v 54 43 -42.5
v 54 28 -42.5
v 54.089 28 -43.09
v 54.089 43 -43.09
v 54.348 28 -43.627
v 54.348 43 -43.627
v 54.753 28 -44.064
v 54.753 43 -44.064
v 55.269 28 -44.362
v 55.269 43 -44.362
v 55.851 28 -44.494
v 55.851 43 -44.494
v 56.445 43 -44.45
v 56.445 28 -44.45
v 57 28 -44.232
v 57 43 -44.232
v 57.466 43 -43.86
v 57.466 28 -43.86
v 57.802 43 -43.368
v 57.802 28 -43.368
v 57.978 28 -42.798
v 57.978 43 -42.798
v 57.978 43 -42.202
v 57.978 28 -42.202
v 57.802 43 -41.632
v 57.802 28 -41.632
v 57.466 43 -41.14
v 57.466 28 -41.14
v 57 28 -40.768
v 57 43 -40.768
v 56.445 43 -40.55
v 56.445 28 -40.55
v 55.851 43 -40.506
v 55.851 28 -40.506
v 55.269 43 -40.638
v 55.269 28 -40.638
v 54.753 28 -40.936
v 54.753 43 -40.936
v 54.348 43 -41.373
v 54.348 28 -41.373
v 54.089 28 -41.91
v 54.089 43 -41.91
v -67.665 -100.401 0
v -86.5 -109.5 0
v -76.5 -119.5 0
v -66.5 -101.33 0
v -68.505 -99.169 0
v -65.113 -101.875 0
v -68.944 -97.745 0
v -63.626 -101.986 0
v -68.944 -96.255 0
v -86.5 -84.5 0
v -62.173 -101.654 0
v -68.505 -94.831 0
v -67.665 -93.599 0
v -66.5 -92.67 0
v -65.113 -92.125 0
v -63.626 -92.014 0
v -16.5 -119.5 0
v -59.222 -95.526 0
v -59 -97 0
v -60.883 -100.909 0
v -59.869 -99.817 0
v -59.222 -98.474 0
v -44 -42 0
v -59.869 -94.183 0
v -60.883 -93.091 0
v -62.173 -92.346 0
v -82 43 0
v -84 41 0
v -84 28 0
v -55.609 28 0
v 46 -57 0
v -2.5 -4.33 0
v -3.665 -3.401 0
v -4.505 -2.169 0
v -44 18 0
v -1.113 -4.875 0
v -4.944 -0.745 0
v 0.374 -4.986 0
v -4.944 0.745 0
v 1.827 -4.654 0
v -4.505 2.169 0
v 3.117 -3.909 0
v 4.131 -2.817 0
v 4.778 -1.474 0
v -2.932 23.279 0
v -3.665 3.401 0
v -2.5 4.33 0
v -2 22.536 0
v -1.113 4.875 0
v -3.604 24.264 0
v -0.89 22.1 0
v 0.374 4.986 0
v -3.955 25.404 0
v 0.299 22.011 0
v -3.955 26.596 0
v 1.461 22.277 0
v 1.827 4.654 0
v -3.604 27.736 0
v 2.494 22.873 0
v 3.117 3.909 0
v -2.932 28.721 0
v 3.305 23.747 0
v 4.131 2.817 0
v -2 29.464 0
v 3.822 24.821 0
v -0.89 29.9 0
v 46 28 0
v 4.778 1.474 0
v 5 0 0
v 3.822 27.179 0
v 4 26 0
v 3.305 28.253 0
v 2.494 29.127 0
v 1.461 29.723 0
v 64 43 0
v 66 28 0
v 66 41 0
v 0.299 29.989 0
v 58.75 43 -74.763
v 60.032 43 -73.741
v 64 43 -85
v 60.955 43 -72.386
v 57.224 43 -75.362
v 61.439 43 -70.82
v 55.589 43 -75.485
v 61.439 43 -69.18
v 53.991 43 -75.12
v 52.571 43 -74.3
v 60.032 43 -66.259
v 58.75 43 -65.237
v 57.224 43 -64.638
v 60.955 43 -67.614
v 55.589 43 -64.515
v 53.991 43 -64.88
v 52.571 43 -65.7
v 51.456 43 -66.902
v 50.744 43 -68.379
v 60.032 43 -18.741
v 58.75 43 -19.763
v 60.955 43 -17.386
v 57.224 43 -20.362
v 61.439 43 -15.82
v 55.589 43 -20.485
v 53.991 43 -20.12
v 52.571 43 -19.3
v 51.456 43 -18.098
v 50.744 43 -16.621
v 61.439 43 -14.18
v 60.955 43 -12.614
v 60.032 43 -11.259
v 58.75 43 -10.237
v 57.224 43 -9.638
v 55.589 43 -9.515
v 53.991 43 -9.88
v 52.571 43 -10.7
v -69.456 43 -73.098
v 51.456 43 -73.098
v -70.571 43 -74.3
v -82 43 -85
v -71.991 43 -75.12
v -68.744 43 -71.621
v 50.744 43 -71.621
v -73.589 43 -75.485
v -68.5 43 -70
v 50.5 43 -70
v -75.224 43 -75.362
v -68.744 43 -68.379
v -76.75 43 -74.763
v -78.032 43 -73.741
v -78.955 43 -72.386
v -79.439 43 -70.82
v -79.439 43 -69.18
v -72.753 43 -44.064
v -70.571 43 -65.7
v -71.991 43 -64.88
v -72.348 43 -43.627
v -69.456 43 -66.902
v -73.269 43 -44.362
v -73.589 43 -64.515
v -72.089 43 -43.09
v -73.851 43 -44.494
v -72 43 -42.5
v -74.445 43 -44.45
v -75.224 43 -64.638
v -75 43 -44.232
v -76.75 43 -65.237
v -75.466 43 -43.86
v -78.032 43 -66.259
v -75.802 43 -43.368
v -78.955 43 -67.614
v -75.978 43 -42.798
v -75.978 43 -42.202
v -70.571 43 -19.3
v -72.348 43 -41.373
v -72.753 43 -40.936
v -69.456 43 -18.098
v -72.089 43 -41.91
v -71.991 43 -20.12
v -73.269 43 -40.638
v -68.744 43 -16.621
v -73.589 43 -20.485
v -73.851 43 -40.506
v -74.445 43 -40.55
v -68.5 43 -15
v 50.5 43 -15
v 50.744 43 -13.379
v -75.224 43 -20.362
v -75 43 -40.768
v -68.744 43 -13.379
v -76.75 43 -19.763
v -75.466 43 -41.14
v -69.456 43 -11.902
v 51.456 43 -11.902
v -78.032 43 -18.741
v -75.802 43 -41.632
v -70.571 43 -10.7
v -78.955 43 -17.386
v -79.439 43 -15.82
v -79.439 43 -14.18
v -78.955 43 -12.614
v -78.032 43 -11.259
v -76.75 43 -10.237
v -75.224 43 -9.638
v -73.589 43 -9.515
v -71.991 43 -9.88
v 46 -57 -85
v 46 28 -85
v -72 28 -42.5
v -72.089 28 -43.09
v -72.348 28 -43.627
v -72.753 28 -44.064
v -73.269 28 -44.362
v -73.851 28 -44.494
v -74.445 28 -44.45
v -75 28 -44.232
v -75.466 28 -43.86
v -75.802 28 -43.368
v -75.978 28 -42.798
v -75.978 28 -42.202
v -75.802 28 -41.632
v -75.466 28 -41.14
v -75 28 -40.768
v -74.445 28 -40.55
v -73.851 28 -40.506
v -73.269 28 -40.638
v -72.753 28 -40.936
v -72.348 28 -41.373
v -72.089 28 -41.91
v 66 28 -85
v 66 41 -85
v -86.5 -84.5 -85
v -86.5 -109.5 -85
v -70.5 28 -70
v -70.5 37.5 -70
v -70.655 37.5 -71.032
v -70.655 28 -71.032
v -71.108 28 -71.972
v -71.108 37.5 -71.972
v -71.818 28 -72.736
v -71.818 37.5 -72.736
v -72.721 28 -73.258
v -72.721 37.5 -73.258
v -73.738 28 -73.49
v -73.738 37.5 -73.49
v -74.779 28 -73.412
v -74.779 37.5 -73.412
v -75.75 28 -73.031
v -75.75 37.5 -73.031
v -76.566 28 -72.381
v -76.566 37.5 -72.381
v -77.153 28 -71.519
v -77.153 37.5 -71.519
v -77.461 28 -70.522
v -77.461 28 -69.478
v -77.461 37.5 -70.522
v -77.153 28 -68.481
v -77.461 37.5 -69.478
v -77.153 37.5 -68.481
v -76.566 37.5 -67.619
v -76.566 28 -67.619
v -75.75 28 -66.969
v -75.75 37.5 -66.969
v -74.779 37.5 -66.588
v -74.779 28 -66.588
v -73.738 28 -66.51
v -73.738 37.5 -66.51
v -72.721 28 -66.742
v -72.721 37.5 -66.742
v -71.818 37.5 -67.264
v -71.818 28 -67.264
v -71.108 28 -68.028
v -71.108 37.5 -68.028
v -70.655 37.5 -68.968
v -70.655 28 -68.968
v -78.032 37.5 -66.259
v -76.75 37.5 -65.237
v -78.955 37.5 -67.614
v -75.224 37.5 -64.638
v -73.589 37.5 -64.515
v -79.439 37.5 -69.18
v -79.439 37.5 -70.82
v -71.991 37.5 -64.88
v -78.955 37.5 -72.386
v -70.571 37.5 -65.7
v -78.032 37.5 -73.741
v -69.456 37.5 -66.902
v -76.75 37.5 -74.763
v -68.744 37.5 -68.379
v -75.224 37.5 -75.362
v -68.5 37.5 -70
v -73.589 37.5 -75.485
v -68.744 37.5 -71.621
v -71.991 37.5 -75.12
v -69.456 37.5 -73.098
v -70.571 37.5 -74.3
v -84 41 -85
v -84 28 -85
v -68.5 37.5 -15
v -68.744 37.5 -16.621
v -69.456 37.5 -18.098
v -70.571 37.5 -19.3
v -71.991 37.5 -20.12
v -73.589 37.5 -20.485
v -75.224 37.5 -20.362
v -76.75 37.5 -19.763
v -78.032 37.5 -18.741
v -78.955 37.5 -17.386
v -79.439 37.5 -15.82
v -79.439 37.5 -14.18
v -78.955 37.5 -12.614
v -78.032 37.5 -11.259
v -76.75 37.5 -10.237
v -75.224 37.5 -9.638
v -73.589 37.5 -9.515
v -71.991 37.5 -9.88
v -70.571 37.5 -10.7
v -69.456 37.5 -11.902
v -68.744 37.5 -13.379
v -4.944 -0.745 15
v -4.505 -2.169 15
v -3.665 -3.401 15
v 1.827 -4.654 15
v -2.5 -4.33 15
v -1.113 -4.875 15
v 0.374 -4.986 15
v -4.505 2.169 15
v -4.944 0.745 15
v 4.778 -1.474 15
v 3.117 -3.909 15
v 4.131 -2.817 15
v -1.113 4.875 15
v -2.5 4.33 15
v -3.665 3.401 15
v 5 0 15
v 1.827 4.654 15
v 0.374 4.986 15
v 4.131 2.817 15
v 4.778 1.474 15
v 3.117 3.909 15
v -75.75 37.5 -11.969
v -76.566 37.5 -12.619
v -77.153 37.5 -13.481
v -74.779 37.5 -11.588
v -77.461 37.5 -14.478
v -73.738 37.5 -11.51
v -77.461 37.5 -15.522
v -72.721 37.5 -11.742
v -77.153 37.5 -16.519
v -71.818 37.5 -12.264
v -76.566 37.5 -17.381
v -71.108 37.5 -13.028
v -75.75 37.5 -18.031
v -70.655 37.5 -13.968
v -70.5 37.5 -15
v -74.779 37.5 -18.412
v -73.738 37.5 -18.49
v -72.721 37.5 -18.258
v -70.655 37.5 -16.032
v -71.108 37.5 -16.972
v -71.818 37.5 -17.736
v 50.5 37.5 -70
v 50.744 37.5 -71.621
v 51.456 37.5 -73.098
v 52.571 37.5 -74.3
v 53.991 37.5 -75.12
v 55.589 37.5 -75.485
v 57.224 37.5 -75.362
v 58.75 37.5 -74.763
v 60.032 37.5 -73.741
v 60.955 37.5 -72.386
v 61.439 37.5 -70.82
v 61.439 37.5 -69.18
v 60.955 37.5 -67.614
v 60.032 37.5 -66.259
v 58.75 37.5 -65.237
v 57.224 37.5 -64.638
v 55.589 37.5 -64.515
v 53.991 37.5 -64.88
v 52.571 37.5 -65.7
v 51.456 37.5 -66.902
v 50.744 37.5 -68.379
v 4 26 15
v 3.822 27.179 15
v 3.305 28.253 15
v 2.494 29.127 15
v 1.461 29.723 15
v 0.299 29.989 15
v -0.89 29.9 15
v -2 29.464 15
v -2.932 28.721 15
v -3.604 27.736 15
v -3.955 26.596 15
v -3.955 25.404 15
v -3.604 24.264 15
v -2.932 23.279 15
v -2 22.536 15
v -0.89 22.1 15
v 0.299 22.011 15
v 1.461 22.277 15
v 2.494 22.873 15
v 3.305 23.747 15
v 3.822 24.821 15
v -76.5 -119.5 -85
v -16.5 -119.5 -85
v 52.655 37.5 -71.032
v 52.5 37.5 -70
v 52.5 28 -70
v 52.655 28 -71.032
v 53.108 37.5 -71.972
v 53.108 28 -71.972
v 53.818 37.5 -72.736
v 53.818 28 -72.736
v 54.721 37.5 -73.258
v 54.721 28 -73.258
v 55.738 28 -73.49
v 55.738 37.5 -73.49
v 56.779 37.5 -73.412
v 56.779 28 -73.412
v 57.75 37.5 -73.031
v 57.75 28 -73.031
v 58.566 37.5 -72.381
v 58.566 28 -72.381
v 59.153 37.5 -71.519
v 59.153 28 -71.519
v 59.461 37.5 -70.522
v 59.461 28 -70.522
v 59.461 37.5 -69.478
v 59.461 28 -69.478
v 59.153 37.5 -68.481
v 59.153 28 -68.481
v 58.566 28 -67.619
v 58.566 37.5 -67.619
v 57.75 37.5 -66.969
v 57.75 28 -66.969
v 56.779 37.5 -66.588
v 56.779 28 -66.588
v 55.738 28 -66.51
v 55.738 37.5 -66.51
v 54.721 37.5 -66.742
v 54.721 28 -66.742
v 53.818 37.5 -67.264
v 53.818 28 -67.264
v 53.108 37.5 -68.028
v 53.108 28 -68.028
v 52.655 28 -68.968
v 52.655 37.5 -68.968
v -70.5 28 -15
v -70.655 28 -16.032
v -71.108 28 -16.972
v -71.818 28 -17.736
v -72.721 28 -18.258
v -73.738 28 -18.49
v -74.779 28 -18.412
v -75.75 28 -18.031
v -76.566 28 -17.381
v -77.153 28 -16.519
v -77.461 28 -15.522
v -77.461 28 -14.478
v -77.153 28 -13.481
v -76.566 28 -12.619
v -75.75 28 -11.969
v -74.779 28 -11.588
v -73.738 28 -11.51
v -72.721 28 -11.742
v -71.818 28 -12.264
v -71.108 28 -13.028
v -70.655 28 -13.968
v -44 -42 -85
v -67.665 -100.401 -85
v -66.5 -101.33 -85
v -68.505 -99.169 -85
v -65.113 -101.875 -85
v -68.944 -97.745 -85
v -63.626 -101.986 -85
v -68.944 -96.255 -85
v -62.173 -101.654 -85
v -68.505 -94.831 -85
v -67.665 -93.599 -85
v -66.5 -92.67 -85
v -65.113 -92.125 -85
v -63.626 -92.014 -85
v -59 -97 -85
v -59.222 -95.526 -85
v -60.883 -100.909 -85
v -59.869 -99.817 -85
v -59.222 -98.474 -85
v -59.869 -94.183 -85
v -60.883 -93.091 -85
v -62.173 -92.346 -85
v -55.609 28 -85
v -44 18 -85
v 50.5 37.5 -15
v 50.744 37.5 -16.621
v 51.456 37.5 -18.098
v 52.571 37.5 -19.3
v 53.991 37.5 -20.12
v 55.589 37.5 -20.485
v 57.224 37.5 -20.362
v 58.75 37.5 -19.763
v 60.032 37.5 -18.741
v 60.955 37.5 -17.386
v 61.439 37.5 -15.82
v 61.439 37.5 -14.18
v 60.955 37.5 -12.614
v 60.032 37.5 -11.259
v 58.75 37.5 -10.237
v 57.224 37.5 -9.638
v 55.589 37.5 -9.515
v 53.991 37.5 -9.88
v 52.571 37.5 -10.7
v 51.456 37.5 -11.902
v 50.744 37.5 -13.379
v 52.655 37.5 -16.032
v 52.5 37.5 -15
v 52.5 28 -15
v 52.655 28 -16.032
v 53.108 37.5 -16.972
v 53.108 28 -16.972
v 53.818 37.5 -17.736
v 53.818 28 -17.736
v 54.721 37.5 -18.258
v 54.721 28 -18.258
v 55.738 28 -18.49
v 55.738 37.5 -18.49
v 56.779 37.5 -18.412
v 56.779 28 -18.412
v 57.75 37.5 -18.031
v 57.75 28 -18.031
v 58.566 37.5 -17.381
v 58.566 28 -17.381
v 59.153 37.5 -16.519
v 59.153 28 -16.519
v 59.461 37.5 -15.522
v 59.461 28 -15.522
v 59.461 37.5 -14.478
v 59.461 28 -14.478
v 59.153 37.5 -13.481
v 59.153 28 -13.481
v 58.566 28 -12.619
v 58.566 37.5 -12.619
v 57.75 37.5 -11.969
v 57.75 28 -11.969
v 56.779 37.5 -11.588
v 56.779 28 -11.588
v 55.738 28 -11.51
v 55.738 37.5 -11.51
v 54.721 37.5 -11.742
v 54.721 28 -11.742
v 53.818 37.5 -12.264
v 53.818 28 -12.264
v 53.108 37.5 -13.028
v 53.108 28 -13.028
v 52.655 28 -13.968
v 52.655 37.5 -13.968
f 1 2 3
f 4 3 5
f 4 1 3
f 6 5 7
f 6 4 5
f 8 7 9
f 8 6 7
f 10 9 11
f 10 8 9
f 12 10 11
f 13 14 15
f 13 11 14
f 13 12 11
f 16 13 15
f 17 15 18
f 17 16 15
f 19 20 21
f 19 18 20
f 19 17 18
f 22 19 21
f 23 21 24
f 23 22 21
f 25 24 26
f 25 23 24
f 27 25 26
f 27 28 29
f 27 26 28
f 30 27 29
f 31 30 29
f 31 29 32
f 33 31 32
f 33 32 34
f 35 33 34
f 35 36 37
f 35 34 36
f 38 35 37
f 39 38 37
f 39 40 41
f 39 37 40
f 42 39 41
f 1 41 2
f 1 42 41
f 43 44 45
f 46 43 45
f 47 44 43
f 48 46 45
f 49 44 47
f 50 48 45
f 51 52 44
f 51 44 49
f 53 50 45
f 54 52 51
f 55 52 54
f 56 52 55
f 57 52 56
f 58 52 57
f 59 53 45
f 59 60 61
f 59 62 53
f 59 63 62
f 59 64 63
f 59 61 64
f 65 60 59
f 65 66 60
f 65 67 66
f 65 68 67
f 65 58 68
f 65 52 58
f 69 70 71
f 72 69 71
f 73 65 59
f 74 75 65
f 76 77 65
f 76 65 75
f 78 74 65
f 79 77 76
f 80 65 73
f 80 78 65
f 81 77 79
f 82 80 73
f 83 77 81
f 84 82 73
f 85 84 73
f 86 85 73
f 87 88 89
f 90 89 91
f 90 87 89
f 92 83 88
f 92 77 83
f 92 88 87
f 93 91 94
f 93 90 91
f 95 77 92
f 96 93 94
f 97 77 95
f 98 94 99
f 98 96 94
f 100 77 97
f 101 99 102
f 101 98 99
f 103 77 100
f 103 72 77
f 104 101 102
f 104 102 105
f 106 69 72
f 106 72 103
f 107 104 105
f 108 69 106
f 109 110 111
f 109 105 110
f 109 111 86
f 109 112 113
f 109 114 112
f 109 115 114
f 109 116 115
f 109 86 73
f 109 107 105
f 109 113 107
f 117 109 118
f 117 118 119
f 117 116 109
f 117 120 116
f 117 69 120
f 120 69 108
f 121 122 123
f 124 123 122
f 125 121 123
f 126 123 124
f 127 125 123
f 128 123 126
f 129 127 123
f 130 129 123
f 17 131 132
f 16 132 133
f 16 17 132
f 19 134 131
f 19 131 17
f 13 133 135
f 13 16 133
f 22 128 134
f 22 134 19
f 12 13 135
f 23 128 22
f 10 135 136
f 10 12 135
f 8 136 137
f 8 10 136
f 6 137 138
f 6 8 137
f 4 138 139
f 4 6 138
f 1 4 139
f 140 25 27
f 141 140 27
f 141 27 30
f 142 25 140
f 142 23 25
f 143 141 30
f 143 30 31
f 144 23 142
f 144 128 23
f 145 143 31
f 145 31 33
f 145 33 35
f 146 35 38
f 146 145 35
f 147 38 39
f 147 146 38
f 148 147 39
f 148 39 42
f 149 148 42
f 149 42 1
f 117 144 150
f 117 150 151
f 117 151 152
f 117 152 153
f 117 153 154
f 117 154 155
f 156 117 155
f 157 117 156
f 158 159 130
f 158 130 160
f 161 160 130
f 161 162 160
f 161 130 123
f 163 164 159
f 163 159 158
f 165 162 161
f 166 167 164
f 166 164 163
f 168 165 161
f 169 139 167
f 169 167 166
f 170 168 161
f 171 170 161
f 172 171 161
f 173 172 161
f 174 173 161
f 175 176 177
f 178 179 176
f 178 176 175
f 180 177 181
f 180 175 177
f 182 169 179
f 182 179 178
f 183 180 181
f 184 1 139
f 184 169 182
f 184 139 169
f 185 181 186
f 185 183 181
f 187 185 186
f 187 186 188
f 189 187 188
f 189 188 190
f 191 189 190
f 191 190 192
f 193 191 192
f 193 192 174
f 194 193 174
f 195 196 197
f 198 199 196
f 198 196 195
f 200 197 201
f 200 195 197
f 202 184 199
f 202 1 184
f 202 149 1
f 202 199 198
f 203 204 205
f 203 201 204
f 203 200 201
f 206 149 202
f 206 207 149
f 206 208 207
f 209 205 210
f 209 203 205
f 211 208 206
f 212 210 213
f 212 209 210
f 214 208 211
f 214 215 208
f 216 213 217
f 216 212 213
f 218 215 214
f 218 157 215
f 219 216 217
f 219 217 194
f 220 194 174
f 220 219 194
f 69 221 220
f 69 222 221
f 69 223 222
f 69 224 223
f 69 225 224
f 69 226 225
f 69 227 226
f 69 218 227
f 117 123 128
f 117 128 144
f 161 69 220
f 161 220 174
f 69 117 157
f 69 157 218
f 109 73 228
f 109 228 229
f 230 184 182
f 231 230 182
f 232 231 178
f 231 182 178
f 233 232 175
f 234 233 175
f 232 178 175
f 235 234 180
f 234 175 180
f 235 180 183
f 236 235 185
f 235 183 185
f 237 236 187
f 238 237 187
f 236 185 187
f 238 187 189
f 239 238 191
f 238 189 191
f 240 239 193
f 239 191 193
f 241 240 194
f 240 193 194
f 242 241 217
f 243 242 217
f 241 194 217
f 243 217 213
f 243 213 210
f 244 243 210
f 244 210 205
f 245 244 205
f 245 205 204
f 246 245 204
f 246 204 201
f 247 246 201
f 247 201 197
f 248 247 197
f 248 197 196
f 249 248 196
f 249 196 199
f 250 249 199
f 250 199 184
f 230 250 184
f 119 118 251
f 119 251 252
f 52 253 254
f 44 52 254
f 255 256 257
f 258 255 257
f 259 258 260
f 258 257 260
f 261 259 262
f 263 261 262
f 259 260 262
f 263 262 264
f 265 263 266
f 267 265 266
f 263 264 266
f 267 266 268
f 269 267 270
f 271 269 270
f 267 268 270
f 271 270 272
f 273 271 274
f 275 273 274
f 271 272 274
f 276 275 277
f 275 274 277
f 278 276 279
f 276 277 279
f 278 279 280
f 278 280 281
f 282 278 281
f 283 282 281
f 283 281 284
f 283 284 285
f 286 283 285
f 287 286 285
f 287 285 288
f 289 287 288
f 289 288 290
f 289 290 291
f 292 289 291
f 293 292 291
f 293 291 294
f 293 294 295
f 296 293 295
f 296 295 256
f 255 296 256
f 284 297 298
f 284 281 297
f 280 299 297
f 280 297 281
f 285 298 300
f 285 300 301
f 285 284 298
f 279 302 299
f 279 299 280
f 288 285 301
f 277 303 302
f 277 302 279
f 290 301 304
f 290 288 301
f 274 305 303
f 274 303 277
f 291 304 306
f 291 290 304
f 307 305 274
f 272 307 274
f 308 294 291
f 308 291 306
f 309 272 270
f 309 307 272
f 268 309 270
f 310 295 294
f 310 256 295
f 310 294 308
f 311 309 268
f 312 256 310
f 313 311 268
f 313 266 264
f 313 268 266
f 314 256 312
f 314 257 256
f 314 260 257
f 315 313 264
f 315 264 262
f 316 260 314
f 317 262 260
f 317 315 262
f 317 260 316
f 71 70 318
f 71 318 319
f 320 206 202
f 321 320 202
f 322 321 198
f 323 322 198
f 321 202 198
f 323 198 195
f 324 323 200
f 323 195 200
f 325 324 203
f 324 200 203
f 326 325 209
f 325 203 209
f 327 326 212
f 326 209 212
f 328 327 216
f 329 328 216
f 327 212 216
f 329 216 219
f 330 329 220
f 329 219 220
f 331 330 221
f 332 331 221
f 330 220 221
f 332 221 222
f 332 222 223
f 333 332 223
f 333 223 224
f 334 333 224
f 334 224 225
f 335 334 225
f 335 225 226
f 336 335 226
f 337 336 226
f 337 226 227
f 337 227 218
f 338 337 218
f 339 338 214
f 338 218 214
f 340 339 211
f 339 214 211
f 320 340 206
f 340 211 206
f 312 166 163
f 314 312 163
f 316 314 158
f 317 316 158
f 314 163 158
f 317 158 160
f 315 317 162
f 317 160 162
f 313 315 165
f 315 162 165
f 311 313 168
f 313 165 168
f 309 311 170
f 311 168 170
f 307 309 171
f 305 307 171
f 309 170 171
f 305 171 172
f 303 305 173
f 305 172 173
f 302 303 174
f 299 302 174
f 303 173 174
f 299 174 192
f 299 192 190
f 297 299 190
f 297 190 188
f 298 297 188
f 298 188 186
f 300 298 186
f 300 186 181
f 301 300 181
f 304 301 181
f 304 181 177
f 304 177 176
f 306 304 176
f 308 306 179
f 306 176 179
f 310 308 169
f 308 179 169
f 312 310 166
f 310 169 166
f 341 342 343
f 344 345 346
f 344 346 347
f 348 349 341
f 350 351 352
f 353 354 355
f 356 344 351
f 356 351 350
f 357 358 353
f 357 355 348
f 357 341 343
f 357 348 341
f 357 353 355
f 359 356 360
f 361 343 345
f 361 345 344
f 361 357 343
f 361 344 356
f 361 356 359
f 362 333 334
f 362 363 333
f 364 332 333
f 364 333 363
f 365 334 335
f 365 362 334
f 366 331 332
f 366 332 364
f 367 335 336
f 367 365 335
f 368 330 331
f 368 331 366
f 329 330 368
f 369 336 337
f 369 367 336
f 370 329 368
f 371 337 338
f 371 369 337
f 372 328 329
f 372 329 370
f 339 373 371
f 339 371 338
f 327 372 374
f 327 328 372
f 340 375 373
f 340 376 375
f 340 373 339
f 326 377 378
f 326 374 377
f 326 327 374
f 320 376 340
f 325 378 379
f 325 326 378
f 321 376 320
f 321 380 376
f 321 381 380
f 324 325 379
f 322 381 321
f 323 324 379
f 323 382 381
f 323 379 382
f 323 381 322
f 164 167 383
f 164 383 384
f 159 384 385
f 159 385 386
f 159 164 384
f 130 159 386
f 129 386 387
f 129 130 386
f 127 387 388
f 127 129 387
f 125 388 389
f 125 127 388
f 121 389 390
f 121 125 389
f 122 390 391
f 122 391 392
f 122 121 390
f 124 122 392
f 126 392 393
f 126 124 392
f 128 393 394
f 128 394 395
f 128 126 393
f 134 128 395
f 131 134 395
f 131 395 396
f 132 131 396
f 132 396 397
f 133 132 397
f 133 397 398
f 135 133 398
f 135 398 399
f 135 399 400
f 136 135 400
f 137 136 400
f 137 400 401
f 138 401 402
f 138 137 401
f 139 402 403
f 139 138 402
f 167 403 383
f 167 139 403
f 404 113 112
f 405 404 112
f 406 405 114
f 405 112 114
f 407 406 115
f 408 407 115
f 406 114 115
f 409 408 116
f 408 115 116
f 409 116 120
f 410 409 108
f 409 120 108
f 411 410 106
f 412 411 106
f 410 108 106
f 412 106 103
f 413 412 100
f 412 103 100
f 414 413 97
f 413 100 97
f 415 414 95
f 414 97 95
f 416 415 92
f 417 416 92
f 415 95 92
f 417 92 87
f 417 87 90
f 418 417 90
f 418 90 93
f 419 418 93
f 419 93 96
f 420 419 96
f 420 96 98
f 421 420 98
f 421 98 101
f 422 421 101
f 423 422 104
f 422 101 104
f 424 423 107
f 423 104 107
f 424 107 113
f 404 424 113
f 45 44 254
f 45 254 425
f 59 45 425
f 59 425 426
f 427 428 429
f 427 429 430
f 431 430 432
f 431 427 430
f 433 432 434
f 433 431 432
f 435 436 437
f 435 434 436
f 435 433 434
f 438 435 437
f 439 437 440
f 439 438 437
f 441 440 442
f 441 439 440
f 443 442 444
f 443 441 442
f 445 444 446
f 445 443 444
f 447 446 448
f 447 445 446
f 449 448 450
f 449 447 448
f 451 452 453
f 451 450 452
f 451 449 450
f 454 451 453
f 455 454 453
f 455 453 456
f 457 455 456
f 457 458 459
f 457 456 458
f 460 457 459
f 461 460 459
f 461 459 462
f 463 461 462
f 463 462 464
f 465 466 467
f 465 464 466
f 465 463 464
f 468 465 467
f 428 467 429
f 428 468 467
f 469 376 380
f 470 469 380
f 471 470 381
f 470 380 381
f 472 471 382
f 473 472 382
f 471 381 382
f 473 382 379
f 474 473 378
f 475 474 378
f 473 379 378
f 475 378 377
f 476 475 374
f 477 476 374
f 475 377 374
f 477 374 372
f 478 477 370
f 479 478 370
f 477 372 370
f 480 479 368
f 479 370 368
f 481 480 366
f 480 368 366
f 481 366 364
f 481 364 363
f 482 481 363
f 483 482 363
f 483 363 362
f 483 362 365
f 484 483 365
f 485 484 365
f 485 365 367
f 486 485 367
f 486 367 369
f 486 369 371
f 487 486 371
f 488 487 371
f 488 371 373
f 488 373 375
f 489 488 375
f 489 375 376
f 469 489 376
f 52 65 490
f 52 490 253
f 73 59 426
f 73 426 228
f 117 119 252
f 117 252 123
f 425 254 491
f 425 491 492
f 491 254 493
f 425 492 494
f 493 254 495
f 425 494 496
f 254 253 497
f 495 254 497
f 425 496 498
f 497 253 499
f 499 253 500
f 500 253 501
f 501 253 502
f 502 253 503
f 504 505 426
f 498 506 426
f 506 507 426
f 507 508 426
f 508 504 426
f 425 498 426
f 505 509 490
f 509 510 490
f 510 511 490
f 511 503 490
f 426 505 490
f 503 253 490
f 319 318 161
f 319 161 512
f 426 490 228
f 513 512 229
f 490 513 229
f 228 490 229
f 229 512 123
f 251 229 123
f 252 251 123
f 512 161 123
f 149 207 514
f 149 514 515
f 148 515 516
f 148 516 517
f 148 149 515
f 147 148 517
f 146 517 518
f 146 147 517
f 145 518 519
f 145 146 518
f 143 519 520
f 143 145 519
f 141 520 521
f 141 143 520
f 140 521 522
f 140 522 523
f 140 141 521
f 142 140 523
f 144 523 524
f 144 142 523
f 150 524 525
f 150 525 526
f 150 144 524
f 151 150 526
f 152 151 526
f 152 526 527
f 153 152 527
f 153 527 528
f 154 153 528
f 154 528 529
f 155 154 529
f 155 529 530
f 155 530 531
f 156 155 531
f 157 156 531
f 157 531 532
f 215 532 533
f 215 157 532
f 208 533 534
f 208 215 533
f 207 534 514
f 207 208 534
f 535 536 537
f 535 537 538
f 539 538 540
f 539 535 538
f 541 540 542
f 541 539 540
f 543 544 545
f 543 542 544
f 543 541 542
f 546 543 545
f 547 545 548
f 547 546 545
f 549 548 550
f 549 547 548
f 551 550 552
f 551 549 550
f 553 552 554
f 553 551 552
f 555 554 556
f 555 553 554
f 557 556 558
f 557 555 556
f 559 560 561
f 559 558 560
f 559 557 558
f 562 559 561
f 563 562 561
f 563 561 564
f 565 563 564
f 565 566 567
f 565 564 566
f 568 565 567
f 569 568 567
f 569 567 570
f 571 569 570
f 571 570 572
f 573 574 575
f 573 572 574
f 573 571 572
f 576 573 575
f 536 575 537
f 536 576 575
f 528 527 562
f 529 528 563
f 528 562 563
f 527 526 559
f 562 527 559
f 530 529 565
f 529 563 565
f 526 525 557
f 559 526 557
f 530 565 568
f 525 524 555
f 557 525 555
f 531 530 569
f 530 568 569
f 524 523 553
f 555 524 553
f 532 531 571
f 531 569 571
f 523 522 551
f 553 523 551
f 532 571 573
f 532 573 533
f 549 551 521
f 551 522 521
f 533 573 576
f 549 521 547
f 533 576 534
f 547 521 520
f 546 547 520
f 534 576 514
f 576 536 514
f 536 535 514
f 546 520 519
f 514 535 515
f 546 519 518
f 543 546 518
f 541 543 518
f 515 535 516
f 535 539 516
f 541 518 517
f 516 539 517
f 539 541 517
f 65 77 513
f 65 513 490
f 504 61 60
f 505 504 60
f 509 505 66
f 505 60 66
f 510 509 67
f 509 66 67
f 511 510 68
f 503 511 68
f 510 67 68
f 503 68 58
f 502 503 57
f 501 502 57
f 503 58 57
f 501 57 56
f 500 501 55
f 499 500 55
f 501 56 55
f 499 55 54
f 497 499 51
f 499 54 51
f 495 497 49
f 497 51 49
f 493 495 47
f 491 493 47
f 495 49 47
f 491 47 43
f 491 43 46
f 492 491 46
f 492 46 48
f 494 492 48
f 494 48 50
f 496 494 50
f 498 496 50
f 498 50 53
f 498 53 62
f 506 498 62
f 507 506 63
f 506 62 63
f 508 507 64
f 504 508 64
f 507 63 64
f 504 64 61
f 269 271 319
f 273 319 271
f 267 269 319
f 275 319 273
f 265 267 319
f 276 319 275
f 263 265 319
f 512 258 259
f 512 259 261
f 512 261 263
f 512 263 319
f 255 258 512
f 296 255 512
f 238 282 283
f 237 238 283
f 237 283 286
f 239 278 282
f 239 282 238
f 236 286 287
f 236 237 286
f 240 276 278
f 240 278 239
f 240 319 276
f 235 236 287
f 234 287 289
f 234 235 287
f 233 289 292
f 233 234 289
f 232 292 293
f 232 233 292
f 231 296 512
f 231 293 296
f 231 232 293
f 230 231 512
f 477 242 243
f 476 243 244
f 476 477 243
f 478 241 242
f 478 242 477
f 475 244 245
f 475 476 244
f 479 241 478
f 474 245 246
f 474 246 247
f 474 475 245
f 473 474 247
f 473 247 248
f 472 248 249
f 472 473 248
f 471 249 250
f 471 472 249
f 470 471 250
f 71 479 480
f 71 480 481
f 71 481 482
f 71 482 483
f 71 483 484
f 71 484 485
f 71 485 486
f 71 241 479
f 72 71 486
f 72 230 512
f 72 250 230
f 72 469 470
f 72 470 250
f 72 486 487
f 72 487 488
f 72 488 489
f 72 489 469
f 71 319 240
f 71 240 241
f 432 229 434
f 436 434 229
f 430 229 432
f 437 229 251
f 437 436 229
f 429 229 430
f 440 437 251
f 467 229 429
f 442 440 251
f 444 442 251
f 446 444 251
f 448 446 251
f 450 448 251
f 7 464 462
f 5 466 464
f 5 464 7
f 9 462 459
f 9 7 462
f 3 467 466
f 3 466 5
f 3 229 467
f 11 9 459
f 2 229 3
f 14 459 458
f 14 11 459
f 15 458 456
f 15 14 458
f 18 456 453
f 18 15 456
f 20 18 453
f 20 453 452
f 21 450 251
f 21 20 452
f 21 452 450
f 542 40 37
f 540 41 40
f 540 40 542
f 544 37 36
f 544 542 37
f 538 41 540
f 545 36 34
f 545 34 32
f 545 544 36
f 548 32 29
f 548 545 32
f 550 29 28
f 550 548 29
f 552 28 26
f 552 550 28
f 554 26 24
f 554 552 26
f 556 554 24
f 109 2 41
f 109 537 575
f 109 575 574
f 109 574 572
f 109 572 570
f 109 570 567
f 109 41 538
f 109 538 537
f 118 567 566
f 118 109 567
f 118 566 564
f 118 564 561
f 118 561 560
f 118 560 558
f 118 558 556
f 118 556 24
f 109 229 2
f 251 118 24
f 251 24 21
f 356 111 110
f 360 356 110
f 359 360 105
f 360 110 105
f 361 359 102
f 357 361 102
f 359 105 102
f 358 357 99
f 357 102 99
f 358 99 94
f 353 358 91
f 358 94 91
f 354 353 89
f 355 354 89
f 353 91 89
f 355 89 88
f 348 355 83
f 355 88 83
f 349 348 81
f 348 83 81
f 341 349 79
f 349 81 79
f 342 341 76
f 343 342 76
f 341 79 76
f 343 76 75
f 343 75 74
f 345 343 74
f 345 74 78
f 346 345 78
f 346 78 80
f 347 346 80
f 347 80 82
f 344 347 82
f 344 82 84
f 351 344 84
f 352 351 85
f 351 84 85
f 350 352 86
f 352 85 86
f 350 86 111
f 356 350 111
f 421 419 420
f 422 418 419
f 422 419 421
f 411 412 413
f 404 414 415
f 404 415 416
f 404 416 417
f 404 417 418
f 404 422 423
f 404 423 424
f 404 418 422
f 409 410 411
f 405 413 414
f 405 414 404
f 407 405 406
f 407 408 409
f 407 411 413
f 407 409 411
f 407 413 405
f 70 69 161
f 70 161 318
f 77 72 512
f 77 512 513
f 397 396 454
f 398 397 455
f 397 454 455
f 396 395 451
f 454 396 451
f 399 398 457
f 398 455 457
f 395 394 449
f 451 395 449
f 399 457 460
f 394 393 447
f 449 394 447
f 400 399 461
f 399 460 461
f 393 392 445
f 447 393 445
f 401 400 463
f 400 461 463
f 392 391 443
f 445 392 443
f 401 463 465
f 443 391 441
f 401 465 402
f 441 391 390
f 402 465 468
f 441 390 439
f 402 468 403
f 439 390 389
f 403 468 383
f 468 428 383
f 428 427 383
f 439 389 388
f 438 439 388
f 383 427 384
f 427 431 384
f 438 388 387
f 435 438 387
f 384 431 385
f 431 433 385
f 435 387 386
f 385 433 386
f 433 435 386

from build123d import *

# Parameters (mm, degrees)
ESQUISSE1_R             = 5
BOSS_EXTRU_1_DEPTH      = 85
ESQUISSE3_R             = 5
ESQUISSE3_R_2           = 4
BOSS_EXTRU_2_DEPTH      = 15
ESQUISSE4_R             = 3.5
ESQUISSE4_R_2           = 2
ENL_V_MAT_EXTRU_1_DEPTH = 28
ESQUISSE6_R             = 5.5
ENL_V_MAT_EXTRU_2_DEPTH = 5.5


with BuildPart() as part:
    # Esquisse1 → Boss.-Extru.1 (new body)
    with BuildSketch(Plane.XY):
        Polygon((-55.609176617, 28), (-44, 18), (-44, -42), (-86.5, -84.5), (-86.5, -109.5), (-76.5, -119.5), (-16.5, -119.5), (46, -57), (46, 28), (66, 28), (66, 41), (64, 43), (-82, 43), (-84, 41), (-84, 28), align=None)
        with Locations((-64, -97)):
            Circle(ESQUISSE1_R, mode=Mode.SUBTRACT)
    extrude(amount=-BOSS_EXTRU_1_DEPTH)

    # Esquisse3 → Boss.-Extru.2 (add)
    with BuildSketch(Plane.XY):
        Circle(ESQUISSE3_R)
        with Locations((0, 26)):
            Circle(ESQUISSE3_R_2)
    extrude(amount=BOSS_EXTRU_2_DEPTH)

    # Esquisse4 → Enlèv. mat.-Extru.1 (cut)
    with BuildSketch(Plane(origin=(0, 43, 0), x_dir=(1, 0, 0), z_dir=(0, 1, 0))):
        with Locations((-74, 70)):
            Circle(ESQUISSE4_R)
        with Locations((-74, 42.5)):
            Circle(ESQUISSE4_R_2)
        with Locations((-74, 15)):
            Circle(ESQUISSE4_R)
    enl_v_mat_extru_1 = extrude(amount=-ENL_V_MAT_EXTRU_1_DEPTH, mode=Mode.SUBTRACT)

    # Esquisse6 → Enlèv. mat.-Extru.2 (cut)
    with BuildSketch(Plane(origin=(0, 43, 0), x_dir=(1, 0, 0), z_dir=(0, 1, 0))):
        with Locations((-74, 70)):
            Circle(ESQUISSE6_R)
        with Locations((-74, 15)):
            Circle(ESQUISSE6_R)
    enl_v_mat_extru_2 = extrude(amount=-ENL_V_MAT_EXTRU_2_DEPTH, mode=Mode.SUBTRACT)

    # Symétrie1: Enlèv. mat.-Extru.1, Enlèv. mat.-Extru.2 across plane
    add(enl_v_mat_extru_1.mirror(Plane(origin=(-9, 0, 0), x_dir=(0, 0, 1), z_dir=(1, 0, 0))), mode=Mode.SUBTRACT)
    add(enl_v_mat_extru_2.mirror(Plane(origin=(-9, 0, 0), x_dir=(0, 0, 1), z_dir=(1, 0, 0))), mode=Mode.SUBTRACT)


solid = part.part
